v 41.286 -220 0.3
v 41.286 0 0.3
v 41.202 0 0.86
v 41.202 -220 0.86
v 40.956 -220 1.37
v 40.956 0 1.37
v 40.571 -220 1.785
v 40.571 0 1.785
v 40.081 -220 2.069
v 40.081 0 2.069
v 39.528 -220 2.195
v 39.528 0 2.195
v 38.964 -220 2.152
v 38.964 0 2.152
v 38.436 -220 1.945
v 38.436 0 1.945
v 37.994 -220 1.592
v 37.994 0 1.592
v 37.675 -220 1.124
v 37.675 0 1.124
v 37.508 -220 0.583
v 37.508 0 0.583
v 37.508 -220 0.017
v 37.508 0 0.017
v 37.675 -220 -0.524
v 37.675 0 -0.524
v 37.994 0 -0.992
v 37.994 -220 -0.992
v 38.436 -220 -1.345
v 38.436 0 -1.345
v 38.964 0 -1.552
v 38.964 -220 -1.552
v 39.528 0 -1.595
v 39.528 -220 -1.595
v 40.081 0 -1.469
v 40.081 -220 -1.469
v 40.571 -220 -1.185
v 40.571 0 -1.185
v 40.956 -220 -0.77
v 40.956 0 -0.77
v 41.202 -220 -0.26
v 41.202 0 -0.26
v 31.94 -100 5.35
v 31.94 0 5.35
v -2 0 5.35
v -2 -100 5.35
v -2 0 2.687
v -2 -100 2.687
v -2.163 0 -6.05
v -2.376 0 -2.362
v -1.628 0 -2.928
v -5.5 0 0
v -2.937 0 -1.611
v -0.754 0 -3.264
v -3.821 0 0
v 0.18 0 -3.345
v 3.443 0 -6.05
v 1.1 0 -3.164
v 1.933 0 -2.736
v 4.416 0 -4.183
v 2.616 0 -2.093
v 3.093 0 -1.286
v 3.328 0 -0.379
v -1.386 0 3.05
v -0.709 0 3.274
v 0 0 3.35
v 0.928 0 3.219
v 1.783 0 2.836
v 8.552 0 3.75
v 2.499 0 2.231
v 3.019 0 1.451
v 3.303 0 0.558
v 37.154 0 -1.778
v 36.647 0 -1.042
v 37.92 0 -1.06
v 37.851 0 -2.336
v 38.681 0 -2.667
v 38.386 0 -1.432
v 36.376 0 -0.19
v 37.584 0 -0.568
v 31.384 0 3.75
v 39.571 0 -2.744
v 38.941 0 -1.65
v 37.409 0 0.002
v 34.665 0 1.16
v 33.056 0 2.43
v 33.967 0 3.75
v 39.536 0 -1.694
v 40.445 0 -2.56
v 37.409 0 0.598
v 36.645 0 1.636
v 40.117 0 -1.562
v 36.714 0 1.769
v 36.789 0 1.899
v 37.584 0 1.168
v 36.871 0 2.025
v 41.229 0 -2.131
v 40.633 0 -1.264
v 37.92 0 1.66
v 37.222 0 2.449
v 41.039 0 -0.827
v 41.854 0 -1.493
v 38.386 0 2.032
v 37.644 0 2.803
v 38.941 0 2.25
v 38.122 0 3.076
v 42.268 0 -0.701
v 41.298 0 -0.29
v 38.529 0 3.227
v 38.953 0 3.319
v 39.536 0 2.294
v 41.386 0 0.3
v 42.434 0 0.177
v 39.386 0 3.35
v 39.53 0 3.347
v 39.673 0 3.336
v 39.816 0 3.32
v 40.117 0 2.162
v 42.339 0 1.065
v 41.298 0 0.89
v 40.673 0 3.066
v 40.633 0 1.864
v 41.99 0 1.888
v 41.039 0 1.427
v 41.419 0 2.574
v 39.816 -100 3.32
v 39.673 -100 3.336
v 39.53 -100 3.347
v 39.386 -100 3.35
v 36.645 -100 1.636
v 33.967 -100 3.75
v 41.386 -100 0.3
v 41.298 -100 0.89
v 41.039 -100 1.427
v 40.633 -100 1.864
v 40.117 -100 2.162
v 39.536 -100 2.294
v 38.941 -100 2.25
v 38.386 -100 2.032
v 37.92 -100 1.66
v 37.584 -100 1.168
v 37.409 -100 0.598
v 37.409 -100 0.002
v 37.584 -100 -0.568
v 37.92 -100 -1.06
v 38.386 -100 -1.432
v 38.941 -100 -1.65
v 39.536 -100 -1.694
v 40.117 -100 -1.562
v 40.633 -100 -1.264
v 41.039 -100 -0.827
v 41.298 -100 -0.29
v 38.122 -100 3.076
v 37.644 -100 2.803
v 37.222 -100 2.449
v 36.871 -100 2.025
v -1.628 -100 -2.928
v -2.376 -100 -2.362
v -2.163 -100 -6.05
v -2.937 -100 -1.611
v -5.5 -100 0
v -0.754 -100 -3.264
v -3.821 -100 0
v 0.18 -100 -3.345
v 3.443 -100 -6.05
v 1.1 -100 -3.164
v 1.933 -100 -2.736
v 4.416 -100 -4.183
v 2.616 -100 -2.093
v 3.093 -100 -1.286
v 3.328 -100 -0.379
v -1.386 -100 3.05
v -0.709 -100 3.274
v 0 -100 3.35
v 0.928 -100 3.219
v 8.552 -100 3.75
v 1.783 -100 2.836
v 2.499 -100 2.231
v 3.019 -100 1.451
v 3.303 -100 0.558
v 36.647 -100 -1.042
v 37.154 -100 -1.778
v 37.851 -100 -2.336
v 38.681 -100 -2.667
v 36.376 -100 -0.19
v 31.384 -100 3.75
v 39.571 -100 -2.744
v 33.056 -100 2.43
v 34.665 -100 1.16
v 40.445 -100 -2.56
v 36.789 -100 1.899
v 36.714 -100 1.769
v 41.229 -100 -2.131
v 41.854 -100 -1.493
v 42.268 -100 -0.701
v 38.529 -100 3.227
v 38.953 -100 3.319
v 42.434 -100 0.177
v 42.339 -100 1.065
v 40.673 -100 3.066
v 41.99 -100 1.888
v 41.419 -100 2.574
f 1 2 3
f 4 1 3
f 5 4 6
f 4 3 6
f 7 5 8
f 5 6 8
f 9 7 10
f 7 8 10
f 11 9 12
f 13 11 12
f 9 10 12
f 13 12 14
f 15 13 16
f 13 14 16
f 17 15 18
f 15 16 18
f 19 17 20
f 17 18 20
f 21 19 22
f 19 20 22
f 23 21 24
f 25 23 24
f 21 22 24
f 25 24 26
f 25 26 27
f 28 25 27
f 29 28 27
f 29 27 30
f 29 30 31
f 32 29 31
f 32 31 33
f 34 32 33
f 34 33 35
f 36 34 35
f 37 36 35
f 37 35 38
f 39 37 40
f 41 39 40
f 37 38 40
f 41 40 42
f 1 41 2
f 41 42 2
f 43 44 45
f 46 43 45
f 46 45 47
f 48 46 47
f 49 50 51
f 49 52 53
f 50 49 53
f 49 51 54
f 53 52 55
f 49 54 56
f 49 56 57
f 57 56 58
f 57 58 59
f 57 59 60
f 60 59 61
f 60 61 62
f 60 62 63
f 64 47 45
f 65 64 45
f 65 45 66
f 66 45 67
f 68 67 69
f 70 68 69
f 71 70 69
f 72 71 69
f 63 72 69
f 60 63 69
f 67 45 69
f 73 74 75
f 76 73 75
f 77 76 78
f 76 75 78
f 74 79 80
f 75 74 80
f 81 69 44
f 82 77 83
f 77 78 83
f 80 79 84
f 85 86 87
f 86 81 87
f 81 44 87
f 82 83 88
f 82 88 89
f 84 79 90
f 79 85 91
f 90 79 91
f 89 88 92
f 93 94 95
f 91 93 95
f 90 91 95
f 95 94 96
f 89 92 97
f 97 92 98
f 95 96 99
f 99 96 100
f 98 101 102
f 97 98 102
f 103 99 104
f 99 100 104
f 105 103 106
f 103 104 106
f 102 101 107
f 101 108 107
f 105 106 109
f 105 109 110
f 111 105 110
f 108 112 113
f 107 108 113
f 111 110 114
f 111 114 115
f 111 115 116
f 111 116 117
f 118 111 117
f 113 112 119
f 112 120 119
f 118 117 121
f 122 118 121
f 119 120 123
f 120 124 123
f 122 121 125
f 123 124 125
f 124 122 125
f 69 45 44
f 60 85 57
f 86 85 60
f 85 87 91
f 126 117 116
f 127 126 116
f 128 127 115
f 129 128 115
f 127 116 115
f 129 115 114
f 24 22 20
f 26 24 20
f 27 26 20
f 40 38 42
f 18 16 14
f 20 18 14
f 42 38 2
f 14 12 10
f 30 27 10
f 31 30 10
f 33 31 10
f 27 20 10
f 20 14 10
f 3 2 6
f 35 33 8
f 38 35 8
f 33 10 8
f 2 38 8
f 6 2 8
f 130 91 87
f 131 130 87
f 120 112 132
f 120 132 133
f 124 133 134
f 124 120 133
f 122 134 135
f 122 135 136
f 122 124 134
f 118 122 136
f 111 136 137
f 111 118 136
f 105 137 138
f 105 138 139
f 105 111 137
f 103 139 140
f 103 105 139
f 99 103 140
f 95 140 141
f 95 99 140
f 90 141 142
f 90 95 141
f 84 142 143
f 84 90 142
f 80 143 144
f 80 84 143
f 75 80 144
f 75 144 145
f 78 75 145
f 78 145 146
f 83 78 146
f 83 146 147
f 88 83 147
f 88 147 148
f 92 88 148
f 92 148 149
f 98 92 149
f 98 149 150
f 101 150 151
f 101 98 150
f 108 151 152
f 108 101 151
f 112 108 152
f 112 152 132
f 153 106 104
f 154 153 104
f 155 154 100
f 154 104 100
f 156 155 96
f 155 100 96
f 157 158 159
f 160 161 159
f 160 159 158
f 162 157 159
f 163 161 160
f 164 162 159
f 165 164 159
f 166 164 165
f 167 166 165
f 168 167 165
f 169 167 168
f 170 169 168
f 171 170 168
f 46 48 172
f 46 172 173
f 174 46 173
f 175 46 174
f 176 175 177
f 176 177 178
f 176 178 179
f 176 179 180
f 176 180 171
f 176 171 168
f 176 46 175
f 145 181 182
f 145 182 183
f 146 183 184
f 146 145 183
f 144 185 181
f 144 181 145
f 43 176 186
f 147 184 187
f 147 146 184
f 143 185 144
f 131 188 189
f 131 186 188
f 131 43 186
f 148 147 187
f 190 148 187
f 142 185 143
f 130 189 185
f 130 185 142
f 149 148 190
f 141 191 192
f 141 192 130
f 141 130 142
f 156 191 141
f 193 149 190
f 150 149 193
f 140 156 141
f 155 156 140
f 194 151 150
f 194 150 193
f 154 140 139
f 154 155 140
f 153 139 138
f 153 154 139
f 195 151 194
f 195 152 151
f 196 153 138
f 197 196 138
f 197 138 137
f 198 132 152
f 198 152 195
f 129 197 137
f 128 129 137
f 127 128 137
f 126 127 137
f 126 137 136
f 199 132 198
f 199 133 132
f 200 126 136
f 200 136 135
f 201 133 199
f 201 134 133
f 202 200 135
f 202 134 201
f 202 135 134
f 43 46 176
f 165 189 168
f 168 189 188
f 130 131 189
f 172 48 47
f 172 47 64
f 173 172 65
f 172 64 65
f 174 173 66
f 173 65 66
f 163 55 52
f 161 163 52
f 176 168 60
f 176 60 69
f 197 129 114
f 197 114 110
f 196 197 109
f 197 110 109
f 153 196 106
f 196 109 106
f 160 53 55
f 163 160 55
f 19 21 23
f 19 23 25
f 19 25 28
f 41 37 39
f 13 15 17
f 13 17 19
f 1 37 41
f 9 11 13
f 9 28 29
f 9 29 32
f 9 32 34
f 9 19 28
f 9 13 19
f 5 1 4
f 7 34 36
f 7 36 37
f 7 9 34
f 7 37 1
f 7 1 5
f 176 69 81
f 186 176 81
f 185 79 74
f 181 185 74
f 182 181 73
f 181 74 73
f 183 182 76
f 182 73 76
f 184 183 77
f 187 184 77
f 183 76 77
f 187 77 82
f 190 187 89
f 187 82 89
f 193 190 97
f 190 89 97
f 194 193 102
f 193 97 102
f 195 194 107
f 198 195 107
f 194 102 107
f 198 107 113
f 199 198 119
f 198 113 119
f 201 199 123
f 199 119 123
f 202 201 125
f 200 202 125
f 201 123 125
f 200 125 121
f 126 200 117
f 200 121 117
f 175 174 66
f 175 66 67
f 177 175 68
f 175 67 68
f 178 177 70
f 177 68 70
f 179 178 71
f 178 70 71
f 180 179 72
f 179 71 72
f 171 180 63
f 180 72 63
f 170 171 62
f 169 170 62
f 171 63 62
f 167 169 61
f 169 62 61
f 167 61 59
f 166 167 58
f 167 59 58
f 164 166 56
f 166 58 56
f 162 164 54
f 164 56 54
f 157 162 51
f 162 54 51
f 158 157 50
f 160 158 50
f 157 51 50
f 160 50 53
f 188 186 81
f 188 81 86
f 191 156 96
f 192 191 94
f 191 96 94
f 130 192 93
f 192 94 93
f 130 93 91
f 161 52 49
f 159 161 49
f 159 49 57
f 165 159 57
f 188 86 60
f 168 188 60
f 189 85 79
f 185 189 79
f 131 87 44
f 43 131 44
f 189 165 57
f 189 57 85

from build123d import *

# Parameters (mm, degrees)
F0_R     = 2
F1_DEPTH = 100
F0_R_2   = 1.9
F2_DEPTH = 220


# Not quite as in the source:
# - a feature names something its author has since deleted; it is built from what else it names


with BuildPart() as f1:
    # F0 (on Front) → F1 (new body)
    with BuildSketch(Plane.XZ):
        with BuildLine():
            Line((31.3843597952, 3.75), (33.9666413399, 3.75))
            Line((33.9666413399, 3.75), (31.9397772655, 5.35))
            Line((31.9397772655, 5.35), (9.3864129766, 5.35))
            Line((9.3864129766, 5.35), (0, 5.35))
            Line((0, 5.35), (0, 3.35))
            ThreePointArc((0, 3.35), (2.8827538929, -1.7065257082), (-2.9370111217, -1.6113552281))
            Line((-2.9370111217, -1.6113552281), (-3.8210614584, 0))
            Line((-3.8210614584, 0), (-5.5, 0))
            Line((-5.5, 0), (-2.1625379435, -6.05))
            Line((-2.1625379435, -6.05), (3.4431787948, -6.05))
            Line((3.4431787948, -6.05), (4.4164381013, -4.1831450595))
            Line((4.4164381013, -4.1831450595), (8.5522748458, 3.75))
            Line((8.5522748458, 3.75), (31.3843597952, 3.75))
        make_face()
        with BuildLine():
            ThreePointArc((36.3761074084, -0.1904695569), (36.368841785, 0.7435810003), (36.6446012215, 1.6360270579))
            Line((36.6446012215, 1.6360270579), (33.9666413399, 3.75))
            Line((33.9666413399, 3.75), (31.3843597952, 3.75))
            Line((31.3843597952, 3.75), (33.0560092942, 2.4304052467))
            Line((33.0560092942, 2.4304052467), (34.6654122242, 1.1599477351))
            Line((34.6654122242, 1.1599477351), (36.3761074084, -0.1904695569))
        make_face()
        with BuildLine():
            ThreePointArc((38.1222629657, 3.0756845552), (37.4249855205, 2.6356588652), (36.8710474529, 2.0249452984))
            ThreePointArc((36.8710474529, 2.0249452984), (36.7506412519, 1.8346685035), (36.6446012215, 1.6360270579))
            ThreePointArc((36.6446012215, 1.6360270579), (36.368841785, 0.7435810003), (36.3761074084, -0.1904695569))
            ThreePointArc((36.3761074084, -0.1904695569), (41.5647564685, -1.8347879593), (39.8159904414, 3.3195965296))
            ThreePointArc((39.8159904414, 3.3195965296), (39.6017389906, 3.3423896377), (39.3864129766, 3.35))
            ThreePointArc((39.3864129766, 3.35), (38.7396278087, 3.2806323065), (38.1222629657, 3.0756845552))
        make_face()
        with Locations((39.3864129766, 0.3)):
            Circle(F0_R, mode=Mode.SUBTRACT)
        Polygon((3.4431787948, -6.05), (34.6654122242, 1.1599477351), (33.0560092942, 2.4304052467), (4.4164381013, -4.1831450595), align=None)
        with BuildLine():
            Line((0, 3.35), (0, 5.35))
            Line((0, 5.35), (-2, 5.35))
            Line((-2, 5.35), (-2, 2.6874709301))
            ThreePointArc((-2, 2.6874709301), (-1.0534401702, 3.180057202), (0, 3.35))
        make_face()
    extrude(amount=F1_DEPTH)


with BuildPart() as f2:
    # F0 (on Front) → F2 (new body)
    with BuildSketch(Plane.XZ):
        with Locations((39.3864129766, 0.3)):
            Circle(F0_R_2)
    extrude(amount=F2_DEPTH)


solid = Compound([f1.part, f2.part])
